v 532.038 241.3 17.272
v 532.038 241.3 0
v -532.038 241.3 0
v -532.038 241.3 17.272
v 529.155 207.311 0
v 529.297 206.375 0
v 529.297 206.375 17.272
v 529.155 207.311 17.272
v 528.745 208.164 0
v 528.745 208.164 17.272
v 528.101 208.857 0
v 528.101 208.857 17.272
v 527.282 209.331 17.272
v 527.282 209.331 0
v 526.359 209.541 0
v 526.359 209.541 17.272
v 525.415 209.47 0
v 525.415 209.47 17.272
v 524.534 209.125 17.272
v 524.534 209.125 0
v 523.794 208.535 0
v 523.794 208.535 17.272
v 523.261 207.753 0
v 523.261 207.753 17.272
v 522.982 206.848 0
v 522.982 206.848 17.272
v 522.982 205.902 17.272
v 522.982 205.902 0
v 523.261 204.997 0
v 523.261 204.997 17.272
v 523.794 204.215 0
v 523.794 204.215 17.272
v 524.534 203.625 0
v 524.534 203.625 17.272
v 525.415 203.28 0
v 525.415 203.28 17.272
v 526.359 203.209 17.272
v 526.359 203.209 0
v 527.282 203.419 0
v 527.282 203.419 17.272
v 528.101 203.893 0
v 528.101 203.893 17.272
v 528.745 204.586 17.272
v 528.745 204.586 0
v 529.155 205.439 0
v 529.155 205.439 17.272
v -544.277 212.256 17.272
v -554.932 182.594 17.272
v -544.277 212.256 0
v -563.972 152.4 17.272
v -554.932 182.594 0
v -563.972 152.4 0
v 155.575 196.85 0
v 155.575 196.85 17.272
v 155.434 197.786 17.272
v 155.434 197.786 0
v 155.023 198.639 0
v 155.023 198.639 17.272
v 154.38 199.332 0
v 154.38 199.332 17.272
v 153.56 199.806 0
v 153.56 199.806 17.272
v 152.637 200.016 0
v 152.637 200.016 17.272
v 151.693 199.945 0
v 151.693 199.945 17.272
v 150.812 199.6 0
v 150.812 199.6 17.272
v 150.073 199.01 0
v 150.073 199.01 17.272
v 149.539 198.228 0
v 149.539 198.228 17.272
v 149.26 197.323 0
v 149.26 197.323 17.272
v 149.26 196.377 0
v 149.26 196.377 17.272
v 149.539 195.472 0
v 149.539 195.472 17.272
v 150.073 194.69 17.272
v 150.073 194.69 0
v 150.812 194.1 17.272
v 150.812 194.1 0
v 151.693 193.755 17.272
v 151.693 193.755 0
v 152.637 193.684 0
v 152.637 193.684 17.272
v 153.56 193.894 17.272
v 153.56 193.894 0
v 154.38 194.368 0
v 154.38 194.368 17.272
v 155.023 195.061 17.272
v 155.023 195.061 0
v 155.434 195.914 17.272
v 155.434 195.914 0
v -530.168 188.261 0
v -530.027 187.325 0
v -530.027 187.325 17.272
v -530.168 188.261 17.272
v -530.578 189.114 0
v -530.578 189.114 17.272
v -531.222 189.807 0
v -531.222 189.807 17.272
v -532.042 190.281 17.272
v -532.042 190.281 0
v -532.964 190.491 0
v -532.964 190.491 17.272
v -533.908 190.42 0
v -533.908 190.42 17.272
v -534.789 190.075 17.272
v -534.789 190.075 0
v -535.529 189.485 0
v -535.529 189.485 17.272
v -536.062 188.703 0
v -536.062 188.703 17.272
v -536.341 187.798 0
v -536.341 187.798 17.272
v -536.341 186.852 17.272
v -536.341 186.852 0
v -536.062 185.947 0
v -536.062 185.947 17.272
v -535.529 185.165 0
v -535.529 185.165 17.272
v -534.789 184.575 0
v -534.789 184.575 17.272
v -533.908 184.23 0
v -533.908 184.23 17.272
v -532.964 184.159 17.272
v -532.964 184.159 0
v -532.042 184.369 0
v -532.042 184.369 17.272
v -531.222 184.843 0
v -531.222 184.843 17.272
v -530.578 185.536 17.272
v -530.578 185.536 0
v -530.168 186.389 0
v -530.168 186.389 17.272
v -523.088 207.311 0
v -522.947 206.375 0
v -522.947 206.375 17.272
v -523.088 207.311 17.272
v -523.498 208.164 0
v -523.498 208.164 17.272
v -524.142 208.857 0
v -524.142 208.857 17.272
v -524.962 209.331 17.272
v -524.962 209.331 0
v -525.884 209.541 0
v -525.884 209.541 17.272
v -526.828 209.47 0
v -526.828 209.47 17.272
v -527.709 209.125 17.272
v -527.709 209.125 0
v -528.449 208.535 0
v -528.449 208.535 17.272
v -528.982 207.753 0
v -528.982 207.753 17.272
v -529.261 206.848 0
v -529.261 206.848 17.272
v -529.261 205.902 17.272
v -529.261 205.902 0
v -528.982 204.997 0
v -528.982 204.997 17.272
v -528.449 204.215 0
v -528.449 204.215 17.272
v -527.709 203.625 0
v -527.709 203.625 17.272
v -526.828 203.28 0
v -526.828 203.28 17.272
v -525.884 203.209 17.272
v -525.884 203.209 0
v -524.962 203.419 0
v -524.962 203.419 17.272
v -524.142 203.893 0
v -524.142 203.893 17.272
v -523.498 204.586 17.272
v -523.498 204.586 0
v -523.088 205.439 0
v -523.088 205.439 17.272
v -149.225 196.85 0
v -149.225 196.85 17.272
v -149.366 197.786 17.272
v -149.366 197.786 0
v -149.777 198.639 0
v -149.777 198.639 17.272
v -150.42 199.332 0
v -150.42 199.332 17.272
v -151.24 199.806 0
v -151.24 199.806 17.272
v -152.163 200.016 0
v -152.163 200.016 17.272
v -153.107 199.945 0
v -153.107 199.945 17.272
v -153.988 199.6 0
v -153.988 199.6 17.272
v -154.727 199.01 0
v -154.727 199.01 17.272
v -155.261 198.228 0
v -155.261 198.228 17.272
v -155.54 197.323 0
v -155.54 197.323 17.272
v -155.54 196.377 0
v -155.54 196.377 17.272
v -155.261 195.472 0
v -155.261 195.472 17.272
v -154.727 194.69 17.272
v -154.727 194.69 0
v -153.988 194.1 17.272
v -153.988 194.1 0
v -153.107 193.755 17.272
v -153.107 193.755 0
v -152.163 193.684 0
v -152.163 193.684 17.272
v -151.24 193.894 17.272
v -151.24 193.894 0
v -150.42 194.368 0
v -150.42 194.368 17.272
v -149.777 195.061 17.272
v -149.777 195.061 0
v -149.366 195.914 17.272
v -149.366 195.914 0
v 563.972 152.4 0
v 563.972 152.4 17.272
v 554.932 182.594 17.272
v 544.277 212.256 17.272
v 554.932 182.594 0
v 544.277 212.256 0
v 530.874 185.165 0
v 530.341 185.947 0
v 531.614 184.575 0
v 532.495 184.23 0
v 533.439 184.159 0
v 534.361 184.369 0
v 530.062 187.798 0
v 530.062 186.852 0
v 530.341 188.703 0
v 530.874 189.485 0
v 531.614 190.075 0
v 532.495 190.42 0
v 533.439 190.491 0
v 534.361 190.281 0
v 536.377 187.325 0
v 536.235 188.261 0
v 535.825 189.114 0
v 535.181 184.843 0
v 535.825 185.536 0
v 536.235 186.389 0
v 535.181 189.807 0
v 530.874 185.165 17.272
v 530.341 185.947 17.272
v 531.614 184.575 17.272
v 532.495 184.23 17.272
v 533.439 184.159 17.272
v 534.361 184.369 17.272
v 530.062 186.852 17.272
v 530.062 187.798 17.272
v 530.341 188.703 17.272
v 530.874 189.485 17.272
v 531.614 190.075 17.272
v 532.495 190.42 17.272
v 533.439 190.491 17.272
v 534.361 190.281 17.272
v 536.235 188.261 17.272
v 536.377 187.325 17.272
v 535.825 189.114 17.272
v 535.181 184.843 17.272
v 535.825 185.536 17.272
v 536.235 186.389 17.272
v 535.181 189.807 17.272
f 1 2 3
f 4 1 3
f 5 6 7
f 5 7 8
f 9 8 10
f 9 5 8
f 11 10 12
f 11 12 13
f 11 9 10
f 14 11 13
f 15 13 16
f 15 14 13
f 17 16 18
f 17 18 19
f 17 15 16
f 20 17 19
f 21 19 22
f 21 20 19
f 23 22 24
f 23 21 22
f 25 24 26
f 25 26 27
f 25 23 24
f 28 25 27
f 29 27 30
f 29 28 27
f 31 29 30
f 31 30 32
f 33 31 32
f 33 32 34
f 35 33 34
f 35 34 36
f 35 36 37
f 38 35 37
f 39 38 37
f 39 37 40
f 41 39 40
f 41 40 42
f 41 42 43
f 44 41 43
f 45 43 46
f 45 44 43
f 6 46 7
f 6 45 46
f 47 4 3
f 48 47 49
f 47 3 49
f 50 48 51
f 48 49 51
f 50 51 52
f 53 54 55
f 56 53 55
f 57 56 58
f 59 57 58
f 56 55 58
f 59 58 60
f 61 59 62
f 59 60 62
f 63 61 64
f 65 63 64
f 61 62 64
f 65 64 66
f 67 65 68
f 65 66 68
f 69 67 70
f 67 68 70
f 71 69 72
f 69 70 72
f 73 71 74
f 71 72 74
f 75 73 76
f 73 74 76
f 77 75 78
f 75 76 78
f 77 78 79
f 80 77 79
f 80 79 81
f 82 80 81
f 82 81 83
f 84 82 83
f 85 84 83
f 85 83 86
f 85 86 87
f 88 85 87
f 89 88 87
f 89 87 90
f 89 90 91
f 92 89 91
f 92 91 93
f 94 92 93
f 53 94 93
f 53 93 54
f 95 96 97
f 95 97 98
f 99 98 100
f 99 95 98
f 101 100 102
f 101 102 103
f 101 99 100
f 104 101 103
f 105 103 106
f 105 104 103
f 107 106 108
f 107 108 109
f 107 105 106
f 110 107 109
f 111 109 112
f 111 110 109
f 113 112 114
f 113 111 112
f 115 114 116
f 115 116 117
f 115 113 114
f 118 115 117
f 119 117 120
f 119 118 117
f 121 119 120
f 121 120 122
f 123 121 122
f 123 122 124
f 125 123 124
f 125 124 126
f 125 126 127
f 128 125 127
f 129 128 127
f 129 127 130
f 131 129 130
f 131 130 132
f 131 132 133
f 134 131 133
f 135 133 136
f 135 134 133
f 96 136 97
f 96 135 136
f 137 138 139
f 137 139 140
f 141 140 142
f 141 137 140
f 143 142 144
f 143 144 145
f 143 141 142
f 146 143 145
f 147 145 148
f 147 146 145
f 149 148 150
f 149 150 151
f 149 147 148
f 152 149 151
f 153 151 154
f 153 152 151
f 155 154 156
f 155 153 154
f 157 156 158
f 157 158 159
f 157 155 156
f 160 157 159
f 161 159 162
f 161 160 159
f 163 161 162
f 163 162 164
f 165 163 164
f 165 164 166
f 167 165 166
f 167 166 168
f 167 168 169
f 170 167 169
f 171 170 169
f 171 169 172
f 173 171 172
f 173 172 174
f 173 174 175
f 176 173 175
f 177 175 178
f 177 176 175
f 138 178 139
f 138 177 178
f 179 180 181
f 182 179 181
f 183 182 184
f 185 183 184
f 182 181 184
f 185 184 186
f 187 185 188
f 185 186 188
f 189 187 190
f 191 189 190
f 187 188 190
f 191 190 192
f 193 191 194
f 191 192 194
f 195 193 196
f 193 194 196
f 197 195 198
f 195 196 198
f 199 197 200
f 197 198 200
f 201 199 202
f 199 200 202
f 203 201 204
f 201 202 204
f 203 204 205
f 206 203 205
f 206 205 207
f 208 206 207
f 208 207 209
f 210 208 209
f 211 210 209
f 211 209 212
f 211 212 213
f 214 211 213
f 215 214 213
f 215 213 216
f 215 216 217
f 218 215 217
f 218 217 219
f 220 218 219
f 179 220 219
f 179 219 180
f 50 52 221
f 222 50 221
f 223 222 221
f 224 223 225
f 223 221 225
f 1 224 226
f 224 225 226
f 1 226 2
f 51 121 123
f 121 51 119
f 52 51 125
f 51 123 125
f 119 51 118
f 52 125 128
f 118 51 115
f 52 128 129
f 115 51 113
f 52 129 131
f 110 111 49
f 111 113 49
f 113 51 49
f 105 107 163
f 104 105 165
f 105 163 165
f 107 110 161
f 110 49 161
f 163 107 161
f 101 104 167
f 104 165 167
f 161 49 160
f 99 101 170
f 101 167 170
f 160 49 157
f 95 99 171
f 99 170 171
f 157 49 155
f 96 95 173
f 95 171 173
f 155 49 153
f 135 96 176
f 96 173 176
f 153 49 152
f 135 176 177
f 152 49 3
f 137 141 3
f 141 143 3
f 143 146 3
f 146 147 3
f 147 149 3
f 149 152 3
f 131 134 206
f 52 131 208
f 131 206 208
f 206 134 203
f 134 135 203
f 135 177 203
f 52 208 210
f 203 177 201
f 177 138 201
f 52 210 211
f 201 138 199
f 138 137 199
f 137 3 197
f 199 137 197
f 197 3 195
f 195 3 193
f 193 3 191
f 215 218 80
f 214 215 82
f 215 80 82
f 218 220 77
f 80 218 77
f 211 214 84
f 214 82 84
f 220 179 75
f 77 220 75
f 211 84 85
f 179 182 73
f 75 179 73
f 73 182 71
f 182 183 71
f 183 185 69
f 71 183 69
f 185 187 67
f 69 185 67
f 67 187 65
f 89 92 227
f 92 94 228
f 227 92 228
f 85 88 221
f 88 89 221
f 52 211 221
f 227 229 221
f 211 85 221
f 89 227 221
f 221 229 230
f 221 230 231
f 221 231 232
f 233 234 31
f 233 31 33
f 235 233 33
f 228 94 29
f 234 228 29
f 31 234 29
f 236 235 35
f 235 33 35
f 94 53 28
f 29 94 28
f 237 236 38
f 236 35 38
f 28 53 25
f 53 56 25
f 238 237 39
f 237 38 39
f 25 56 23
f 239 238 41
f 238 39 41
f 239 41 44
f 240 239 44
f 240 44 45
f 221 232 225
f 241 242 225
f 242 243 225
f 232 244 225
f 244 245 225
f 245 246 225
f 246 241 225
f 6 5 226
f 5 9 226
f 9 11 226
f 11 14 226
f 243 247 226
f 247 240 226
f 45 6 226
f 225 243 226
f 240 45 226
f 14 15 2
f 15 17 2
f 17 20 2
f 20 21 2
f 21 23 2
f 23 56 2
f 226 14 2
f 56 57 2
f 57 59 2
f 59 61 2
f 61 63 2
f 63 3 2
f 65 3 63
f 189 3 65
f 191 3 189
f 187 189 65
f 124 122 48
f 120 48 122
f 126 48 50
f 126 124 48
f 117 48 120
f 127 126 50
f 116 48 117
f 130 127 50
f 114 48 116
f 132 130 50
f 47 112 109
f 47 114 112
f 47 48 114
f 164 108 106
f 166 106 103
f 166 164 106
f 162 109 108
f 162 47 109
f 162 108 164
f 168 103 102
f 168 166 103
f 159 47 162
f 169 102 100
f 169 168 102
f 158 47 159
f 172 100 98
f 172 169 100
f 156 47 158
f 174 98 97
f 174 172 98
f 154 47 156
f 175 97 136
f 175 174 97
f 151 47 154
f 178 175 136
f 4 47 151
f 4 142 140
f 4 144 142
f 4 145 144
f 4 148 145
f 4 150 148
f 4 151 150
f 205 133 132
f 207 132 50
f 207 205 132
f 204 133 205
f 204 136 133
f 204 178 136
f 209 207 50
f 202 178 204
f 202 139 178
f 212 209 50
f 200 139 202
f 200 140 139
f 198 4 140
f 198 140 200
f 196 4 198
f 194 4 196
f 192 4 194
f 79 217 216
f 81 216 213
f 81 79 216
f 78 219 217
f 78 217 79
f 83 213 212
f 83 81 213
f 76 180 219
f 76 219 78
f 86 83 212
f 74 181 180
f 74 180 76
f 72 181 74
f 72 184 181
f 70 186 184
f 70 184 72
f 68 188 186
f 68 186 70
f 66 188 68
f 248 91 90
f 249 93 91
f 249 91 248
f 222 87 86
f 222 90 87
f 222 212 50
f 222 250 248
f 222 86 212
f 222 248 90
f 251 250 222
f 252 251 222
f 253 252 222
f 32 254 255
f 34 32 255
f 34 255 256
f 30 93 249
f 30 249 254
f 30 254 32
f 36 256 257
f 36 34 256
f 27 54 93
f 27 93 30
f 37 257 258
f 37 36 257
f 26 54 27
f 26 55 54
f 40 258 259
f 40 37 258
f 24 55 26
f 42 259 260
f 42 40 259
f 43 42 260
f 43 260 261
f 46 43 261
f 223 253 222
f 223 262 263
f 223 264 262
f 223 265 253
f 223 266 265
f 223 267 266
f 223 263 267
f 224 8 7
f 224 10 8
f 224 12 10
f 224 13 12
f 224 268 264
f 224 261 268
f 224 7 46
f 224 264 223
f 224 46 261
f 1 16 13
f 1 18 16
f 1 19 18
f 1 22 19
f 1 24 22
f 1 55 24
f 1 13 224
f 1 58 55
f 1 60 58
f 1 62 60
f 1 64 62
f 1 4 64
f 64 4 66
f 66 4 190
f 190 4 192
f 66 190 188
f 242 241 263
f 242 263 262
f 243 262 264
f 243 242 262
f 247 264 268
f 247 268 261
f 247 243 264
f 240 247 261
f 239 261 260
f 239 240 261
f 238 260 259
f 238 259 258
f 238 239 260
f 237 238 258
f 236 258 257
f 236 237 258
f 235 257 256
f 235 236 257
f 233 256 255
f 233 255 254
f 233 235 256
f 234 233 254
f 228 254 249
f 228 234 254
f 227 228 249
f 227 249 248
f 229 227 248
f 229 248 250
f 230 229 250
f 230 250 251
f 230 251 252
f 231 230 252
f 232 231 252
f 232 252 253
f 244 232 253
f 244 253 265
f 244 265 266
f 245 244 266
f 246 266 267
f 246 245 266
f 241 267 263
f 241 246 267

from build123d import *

# Parameters (mm, degrees)
SKETCH1_R           = 3.175
BOSS_EXTRUDE1_DEPTH = 17.272
CUT_EXTRUDE2_REACH  = 615.668
SKETCH3_R           = 3.175


with BuildPart() as part:
    # Sketch1 → Boss-Extrude1 (new body)
    with BuildSketch(Plane.XY):
        with BuildLine():
            Line((-563.971524104, 152.4), (563.971524104, 152.4))
            ThreePointArc((563.971524104, 152.4), (549.804304053, 197.496499323), (532.037545668, 241.3))
            Line((532.037545668, 241.3), (-532.037545668, 241.3))
            ThreePointArc((-532.037545668, 241.3), (-549.804304053, 197.496499323), (-563.971524104, 152.4))
        make_face()
        with Locations((533.201525575, 187.325)):
            Circle(SKETCH1_R, mode=Mode.SUBTRACT)
        with Locations((526.121546674, 206.375)):
            Circle(SKETCH1_R, mode=Mode.SUBTRACT)
        with Locations((-533.201525575, 187.325)):
            Circle(SKETCH1_R, mode=Mode.SUBTRACT)
        with Locations((-526.121546674, 206.375)):
            Circle(SKETCH1_R, mode=Mode.SUBTRACT)
    extrude(amount=BOSS_EXTRUDE1_DEPTH)

    # Sketch3 → Cut-Extrude2 (cut, up to next)
    with BuildSketch(Plane.XY.offset(17.272), mode=Mode.PRIVATE) as cut_extrude2_sk1:
        with Locations((152.4, 196.85)):
            Circle(SKETCH3_R)
    cut_extrude2_tool1 = extrude(cut_extrude2_sk1.sketch, amount=-CUT_EXTRUDE2_REACH, mode=Mode.PRIVATE) & part.part
    # Sketch3 → Cut-Extrude2 (cut, up to next)
    with BuildSketch(Plane.XY.offset(17.272), mode=Mode.PRIVATE) as cut_extrude2_sk2:
        with Locations((-152.4, 196.85)):
            Circle(SKETCH3_R)
    cut_extrude2_tool2 = extrude(cut_extrude2_sk2.sketch, amount=-CUT_EXTRUDE2_REACH, mode=Mode.PRIVATE) & part.part
    add(cut_extrude2_tool1.solids().sort_by_distance((152.4, 196.85, 17.272))[0], mode=Mode.SUBTRACT)
    add(cut_extrude2_tool2.solids().sort_by_distance((-152.4, 196.85, 17.272))[0], mode=Mode.SUBTRACT)


solid = part.part
